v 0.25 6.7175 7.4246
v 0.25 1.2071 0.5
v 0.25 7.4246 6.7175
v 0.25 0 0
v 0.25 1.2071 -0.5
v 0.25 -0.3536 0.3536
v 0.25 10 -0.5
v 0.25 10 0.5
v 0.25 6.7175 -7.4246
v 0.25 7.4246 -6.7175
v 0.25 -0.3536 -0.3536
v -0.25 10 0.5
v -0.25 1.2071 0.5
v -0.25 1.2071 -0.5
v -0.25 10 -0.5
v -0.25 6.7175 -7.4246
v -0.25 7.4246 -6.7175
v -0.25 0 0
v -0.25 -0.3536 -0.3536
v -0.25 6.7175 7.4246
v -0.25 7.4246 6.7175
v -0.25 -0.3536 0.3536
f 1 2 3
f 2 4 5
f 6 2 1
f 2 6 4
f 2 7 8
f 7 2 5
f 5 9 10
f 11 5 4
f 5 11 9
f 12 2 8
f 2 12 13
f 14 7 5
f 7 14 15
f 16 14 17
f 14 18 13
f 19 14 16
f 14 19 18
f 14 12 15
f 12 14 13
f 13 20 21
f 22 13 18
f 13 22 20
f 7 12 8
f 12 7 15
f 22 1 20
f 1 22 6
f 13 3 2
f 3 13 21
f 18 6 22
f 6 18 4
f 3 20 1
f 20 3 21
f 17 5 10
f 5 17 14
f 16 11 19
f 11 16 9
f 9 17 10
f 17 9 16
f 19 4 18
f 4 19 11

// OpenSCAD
length = 10;
width_x = 0.5;
width_z = 1;
module shape() {
    translate([0, length/2, 0])
    cube([width_x, length, width_z], center=true);
}

shape();
color("Salmon") rotate(a=45, v=[1, 0, 0]) shape();
color("LightSlateGray") rotate(a=45, v=[-1, 0, 0]) shape();
